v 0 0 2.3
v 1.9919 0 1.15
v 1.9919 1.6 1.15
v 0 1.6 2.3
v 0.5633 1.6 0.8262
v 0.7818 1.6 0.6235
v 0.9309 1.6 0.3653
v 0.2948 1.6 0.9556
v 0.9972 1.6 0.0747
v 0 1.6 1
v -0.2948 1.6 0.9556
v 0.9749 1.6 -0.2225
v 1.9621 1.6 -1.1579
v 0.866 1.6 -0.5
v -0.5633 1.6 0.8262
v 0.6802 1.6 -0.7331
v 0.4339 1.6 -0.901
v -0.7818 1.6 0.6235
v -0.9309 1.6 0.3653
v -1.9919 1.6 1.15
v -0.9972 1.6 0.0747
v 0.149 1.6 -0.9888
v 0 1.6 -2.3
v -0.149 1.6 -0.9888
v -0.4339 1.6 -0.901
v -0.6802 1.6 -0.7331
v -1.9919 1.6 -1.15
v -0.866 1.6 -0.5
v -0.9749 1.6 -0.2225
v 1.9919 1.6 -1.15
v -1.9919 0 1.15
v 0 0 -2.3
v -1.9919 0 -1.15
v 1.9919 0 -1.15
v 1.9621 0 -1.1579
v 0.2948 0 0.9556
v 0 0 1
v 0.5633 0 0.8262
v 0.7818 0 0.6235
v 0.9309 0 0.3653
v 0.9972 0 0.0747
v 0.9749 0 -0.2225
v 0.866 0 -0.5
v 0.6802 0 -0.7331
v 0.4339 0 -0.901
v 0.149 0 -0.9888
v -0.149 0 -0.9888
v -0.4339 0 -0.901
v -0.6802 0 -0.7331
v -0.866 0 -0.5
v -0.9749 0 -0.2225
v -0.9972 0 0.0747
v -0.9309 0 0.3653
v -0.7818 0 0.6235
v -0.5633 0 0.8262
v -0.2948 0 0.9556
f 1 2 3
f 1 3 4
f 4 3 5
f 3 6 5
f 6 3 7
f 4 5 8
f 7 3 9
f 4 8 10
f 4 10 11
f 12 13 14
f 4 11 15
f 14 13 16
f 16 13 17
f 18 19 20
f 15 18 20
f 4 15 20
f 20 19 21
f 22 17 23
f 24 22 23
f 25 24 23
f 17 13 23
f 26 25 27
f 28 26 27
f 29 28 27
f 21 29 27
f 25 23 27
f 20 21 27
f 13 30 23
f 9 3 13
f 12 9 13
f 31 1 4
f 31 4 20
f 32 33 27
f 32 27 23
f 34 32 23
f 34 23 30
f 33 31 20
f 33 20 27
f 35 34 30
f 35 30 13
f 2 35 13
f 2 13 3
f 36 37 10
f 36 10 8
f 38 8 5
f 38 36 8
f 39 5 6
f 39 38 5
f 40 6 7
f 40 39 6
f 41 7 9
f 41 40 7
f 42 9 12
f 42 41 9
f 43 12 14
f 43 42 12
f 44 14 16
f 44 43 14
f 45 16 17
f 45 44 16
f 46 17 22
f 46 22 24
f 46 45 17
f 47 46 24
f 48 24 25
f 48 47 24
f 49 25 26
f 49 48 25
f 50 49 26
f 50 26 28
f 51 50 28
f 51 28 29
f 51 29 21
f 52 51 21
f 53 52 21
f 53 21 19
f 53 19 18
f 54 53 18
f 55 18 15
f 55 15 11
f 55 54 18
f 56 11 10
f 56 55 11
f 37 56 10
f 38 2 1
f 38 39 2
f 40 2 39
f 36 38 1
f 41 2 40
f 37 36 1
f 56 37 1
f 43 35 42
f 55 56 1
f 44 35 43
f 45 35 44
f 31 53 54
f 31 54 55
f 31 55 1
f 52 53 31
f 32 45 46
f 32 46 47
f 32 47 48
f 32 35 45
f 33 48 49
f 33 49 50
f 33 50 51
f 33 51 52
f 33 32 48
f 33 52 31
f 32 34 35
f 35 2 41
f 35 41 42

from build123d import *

# Parameters (mm, degrees)
SKETCH1_R           = 1
BOSS_EXTRUDE1_DEPTH = 1.6


with BuildPart() as part:
    # Sketch1 → Boss-Extrude1 (new body)
    with BuildSketch(Plane(origin=(0, 0, 0), x_dir=(1, 0, 0), z_dir=(0, 1, 0))):
        Polygon((0, 2.3), (-1.991858429, 1.15), (-1.991858429, -1.15), (0, -2.3), (1.991858429, -1.15), (1.962121601, 1.157885333), (1.991858429, 1.15), align=None)
        Circle(SKETCH1_R, mode=Mode.SUBTRACT)
    extrude(amount=BOSS_EXTRUDE1_DEPTH)


solid = part.part
